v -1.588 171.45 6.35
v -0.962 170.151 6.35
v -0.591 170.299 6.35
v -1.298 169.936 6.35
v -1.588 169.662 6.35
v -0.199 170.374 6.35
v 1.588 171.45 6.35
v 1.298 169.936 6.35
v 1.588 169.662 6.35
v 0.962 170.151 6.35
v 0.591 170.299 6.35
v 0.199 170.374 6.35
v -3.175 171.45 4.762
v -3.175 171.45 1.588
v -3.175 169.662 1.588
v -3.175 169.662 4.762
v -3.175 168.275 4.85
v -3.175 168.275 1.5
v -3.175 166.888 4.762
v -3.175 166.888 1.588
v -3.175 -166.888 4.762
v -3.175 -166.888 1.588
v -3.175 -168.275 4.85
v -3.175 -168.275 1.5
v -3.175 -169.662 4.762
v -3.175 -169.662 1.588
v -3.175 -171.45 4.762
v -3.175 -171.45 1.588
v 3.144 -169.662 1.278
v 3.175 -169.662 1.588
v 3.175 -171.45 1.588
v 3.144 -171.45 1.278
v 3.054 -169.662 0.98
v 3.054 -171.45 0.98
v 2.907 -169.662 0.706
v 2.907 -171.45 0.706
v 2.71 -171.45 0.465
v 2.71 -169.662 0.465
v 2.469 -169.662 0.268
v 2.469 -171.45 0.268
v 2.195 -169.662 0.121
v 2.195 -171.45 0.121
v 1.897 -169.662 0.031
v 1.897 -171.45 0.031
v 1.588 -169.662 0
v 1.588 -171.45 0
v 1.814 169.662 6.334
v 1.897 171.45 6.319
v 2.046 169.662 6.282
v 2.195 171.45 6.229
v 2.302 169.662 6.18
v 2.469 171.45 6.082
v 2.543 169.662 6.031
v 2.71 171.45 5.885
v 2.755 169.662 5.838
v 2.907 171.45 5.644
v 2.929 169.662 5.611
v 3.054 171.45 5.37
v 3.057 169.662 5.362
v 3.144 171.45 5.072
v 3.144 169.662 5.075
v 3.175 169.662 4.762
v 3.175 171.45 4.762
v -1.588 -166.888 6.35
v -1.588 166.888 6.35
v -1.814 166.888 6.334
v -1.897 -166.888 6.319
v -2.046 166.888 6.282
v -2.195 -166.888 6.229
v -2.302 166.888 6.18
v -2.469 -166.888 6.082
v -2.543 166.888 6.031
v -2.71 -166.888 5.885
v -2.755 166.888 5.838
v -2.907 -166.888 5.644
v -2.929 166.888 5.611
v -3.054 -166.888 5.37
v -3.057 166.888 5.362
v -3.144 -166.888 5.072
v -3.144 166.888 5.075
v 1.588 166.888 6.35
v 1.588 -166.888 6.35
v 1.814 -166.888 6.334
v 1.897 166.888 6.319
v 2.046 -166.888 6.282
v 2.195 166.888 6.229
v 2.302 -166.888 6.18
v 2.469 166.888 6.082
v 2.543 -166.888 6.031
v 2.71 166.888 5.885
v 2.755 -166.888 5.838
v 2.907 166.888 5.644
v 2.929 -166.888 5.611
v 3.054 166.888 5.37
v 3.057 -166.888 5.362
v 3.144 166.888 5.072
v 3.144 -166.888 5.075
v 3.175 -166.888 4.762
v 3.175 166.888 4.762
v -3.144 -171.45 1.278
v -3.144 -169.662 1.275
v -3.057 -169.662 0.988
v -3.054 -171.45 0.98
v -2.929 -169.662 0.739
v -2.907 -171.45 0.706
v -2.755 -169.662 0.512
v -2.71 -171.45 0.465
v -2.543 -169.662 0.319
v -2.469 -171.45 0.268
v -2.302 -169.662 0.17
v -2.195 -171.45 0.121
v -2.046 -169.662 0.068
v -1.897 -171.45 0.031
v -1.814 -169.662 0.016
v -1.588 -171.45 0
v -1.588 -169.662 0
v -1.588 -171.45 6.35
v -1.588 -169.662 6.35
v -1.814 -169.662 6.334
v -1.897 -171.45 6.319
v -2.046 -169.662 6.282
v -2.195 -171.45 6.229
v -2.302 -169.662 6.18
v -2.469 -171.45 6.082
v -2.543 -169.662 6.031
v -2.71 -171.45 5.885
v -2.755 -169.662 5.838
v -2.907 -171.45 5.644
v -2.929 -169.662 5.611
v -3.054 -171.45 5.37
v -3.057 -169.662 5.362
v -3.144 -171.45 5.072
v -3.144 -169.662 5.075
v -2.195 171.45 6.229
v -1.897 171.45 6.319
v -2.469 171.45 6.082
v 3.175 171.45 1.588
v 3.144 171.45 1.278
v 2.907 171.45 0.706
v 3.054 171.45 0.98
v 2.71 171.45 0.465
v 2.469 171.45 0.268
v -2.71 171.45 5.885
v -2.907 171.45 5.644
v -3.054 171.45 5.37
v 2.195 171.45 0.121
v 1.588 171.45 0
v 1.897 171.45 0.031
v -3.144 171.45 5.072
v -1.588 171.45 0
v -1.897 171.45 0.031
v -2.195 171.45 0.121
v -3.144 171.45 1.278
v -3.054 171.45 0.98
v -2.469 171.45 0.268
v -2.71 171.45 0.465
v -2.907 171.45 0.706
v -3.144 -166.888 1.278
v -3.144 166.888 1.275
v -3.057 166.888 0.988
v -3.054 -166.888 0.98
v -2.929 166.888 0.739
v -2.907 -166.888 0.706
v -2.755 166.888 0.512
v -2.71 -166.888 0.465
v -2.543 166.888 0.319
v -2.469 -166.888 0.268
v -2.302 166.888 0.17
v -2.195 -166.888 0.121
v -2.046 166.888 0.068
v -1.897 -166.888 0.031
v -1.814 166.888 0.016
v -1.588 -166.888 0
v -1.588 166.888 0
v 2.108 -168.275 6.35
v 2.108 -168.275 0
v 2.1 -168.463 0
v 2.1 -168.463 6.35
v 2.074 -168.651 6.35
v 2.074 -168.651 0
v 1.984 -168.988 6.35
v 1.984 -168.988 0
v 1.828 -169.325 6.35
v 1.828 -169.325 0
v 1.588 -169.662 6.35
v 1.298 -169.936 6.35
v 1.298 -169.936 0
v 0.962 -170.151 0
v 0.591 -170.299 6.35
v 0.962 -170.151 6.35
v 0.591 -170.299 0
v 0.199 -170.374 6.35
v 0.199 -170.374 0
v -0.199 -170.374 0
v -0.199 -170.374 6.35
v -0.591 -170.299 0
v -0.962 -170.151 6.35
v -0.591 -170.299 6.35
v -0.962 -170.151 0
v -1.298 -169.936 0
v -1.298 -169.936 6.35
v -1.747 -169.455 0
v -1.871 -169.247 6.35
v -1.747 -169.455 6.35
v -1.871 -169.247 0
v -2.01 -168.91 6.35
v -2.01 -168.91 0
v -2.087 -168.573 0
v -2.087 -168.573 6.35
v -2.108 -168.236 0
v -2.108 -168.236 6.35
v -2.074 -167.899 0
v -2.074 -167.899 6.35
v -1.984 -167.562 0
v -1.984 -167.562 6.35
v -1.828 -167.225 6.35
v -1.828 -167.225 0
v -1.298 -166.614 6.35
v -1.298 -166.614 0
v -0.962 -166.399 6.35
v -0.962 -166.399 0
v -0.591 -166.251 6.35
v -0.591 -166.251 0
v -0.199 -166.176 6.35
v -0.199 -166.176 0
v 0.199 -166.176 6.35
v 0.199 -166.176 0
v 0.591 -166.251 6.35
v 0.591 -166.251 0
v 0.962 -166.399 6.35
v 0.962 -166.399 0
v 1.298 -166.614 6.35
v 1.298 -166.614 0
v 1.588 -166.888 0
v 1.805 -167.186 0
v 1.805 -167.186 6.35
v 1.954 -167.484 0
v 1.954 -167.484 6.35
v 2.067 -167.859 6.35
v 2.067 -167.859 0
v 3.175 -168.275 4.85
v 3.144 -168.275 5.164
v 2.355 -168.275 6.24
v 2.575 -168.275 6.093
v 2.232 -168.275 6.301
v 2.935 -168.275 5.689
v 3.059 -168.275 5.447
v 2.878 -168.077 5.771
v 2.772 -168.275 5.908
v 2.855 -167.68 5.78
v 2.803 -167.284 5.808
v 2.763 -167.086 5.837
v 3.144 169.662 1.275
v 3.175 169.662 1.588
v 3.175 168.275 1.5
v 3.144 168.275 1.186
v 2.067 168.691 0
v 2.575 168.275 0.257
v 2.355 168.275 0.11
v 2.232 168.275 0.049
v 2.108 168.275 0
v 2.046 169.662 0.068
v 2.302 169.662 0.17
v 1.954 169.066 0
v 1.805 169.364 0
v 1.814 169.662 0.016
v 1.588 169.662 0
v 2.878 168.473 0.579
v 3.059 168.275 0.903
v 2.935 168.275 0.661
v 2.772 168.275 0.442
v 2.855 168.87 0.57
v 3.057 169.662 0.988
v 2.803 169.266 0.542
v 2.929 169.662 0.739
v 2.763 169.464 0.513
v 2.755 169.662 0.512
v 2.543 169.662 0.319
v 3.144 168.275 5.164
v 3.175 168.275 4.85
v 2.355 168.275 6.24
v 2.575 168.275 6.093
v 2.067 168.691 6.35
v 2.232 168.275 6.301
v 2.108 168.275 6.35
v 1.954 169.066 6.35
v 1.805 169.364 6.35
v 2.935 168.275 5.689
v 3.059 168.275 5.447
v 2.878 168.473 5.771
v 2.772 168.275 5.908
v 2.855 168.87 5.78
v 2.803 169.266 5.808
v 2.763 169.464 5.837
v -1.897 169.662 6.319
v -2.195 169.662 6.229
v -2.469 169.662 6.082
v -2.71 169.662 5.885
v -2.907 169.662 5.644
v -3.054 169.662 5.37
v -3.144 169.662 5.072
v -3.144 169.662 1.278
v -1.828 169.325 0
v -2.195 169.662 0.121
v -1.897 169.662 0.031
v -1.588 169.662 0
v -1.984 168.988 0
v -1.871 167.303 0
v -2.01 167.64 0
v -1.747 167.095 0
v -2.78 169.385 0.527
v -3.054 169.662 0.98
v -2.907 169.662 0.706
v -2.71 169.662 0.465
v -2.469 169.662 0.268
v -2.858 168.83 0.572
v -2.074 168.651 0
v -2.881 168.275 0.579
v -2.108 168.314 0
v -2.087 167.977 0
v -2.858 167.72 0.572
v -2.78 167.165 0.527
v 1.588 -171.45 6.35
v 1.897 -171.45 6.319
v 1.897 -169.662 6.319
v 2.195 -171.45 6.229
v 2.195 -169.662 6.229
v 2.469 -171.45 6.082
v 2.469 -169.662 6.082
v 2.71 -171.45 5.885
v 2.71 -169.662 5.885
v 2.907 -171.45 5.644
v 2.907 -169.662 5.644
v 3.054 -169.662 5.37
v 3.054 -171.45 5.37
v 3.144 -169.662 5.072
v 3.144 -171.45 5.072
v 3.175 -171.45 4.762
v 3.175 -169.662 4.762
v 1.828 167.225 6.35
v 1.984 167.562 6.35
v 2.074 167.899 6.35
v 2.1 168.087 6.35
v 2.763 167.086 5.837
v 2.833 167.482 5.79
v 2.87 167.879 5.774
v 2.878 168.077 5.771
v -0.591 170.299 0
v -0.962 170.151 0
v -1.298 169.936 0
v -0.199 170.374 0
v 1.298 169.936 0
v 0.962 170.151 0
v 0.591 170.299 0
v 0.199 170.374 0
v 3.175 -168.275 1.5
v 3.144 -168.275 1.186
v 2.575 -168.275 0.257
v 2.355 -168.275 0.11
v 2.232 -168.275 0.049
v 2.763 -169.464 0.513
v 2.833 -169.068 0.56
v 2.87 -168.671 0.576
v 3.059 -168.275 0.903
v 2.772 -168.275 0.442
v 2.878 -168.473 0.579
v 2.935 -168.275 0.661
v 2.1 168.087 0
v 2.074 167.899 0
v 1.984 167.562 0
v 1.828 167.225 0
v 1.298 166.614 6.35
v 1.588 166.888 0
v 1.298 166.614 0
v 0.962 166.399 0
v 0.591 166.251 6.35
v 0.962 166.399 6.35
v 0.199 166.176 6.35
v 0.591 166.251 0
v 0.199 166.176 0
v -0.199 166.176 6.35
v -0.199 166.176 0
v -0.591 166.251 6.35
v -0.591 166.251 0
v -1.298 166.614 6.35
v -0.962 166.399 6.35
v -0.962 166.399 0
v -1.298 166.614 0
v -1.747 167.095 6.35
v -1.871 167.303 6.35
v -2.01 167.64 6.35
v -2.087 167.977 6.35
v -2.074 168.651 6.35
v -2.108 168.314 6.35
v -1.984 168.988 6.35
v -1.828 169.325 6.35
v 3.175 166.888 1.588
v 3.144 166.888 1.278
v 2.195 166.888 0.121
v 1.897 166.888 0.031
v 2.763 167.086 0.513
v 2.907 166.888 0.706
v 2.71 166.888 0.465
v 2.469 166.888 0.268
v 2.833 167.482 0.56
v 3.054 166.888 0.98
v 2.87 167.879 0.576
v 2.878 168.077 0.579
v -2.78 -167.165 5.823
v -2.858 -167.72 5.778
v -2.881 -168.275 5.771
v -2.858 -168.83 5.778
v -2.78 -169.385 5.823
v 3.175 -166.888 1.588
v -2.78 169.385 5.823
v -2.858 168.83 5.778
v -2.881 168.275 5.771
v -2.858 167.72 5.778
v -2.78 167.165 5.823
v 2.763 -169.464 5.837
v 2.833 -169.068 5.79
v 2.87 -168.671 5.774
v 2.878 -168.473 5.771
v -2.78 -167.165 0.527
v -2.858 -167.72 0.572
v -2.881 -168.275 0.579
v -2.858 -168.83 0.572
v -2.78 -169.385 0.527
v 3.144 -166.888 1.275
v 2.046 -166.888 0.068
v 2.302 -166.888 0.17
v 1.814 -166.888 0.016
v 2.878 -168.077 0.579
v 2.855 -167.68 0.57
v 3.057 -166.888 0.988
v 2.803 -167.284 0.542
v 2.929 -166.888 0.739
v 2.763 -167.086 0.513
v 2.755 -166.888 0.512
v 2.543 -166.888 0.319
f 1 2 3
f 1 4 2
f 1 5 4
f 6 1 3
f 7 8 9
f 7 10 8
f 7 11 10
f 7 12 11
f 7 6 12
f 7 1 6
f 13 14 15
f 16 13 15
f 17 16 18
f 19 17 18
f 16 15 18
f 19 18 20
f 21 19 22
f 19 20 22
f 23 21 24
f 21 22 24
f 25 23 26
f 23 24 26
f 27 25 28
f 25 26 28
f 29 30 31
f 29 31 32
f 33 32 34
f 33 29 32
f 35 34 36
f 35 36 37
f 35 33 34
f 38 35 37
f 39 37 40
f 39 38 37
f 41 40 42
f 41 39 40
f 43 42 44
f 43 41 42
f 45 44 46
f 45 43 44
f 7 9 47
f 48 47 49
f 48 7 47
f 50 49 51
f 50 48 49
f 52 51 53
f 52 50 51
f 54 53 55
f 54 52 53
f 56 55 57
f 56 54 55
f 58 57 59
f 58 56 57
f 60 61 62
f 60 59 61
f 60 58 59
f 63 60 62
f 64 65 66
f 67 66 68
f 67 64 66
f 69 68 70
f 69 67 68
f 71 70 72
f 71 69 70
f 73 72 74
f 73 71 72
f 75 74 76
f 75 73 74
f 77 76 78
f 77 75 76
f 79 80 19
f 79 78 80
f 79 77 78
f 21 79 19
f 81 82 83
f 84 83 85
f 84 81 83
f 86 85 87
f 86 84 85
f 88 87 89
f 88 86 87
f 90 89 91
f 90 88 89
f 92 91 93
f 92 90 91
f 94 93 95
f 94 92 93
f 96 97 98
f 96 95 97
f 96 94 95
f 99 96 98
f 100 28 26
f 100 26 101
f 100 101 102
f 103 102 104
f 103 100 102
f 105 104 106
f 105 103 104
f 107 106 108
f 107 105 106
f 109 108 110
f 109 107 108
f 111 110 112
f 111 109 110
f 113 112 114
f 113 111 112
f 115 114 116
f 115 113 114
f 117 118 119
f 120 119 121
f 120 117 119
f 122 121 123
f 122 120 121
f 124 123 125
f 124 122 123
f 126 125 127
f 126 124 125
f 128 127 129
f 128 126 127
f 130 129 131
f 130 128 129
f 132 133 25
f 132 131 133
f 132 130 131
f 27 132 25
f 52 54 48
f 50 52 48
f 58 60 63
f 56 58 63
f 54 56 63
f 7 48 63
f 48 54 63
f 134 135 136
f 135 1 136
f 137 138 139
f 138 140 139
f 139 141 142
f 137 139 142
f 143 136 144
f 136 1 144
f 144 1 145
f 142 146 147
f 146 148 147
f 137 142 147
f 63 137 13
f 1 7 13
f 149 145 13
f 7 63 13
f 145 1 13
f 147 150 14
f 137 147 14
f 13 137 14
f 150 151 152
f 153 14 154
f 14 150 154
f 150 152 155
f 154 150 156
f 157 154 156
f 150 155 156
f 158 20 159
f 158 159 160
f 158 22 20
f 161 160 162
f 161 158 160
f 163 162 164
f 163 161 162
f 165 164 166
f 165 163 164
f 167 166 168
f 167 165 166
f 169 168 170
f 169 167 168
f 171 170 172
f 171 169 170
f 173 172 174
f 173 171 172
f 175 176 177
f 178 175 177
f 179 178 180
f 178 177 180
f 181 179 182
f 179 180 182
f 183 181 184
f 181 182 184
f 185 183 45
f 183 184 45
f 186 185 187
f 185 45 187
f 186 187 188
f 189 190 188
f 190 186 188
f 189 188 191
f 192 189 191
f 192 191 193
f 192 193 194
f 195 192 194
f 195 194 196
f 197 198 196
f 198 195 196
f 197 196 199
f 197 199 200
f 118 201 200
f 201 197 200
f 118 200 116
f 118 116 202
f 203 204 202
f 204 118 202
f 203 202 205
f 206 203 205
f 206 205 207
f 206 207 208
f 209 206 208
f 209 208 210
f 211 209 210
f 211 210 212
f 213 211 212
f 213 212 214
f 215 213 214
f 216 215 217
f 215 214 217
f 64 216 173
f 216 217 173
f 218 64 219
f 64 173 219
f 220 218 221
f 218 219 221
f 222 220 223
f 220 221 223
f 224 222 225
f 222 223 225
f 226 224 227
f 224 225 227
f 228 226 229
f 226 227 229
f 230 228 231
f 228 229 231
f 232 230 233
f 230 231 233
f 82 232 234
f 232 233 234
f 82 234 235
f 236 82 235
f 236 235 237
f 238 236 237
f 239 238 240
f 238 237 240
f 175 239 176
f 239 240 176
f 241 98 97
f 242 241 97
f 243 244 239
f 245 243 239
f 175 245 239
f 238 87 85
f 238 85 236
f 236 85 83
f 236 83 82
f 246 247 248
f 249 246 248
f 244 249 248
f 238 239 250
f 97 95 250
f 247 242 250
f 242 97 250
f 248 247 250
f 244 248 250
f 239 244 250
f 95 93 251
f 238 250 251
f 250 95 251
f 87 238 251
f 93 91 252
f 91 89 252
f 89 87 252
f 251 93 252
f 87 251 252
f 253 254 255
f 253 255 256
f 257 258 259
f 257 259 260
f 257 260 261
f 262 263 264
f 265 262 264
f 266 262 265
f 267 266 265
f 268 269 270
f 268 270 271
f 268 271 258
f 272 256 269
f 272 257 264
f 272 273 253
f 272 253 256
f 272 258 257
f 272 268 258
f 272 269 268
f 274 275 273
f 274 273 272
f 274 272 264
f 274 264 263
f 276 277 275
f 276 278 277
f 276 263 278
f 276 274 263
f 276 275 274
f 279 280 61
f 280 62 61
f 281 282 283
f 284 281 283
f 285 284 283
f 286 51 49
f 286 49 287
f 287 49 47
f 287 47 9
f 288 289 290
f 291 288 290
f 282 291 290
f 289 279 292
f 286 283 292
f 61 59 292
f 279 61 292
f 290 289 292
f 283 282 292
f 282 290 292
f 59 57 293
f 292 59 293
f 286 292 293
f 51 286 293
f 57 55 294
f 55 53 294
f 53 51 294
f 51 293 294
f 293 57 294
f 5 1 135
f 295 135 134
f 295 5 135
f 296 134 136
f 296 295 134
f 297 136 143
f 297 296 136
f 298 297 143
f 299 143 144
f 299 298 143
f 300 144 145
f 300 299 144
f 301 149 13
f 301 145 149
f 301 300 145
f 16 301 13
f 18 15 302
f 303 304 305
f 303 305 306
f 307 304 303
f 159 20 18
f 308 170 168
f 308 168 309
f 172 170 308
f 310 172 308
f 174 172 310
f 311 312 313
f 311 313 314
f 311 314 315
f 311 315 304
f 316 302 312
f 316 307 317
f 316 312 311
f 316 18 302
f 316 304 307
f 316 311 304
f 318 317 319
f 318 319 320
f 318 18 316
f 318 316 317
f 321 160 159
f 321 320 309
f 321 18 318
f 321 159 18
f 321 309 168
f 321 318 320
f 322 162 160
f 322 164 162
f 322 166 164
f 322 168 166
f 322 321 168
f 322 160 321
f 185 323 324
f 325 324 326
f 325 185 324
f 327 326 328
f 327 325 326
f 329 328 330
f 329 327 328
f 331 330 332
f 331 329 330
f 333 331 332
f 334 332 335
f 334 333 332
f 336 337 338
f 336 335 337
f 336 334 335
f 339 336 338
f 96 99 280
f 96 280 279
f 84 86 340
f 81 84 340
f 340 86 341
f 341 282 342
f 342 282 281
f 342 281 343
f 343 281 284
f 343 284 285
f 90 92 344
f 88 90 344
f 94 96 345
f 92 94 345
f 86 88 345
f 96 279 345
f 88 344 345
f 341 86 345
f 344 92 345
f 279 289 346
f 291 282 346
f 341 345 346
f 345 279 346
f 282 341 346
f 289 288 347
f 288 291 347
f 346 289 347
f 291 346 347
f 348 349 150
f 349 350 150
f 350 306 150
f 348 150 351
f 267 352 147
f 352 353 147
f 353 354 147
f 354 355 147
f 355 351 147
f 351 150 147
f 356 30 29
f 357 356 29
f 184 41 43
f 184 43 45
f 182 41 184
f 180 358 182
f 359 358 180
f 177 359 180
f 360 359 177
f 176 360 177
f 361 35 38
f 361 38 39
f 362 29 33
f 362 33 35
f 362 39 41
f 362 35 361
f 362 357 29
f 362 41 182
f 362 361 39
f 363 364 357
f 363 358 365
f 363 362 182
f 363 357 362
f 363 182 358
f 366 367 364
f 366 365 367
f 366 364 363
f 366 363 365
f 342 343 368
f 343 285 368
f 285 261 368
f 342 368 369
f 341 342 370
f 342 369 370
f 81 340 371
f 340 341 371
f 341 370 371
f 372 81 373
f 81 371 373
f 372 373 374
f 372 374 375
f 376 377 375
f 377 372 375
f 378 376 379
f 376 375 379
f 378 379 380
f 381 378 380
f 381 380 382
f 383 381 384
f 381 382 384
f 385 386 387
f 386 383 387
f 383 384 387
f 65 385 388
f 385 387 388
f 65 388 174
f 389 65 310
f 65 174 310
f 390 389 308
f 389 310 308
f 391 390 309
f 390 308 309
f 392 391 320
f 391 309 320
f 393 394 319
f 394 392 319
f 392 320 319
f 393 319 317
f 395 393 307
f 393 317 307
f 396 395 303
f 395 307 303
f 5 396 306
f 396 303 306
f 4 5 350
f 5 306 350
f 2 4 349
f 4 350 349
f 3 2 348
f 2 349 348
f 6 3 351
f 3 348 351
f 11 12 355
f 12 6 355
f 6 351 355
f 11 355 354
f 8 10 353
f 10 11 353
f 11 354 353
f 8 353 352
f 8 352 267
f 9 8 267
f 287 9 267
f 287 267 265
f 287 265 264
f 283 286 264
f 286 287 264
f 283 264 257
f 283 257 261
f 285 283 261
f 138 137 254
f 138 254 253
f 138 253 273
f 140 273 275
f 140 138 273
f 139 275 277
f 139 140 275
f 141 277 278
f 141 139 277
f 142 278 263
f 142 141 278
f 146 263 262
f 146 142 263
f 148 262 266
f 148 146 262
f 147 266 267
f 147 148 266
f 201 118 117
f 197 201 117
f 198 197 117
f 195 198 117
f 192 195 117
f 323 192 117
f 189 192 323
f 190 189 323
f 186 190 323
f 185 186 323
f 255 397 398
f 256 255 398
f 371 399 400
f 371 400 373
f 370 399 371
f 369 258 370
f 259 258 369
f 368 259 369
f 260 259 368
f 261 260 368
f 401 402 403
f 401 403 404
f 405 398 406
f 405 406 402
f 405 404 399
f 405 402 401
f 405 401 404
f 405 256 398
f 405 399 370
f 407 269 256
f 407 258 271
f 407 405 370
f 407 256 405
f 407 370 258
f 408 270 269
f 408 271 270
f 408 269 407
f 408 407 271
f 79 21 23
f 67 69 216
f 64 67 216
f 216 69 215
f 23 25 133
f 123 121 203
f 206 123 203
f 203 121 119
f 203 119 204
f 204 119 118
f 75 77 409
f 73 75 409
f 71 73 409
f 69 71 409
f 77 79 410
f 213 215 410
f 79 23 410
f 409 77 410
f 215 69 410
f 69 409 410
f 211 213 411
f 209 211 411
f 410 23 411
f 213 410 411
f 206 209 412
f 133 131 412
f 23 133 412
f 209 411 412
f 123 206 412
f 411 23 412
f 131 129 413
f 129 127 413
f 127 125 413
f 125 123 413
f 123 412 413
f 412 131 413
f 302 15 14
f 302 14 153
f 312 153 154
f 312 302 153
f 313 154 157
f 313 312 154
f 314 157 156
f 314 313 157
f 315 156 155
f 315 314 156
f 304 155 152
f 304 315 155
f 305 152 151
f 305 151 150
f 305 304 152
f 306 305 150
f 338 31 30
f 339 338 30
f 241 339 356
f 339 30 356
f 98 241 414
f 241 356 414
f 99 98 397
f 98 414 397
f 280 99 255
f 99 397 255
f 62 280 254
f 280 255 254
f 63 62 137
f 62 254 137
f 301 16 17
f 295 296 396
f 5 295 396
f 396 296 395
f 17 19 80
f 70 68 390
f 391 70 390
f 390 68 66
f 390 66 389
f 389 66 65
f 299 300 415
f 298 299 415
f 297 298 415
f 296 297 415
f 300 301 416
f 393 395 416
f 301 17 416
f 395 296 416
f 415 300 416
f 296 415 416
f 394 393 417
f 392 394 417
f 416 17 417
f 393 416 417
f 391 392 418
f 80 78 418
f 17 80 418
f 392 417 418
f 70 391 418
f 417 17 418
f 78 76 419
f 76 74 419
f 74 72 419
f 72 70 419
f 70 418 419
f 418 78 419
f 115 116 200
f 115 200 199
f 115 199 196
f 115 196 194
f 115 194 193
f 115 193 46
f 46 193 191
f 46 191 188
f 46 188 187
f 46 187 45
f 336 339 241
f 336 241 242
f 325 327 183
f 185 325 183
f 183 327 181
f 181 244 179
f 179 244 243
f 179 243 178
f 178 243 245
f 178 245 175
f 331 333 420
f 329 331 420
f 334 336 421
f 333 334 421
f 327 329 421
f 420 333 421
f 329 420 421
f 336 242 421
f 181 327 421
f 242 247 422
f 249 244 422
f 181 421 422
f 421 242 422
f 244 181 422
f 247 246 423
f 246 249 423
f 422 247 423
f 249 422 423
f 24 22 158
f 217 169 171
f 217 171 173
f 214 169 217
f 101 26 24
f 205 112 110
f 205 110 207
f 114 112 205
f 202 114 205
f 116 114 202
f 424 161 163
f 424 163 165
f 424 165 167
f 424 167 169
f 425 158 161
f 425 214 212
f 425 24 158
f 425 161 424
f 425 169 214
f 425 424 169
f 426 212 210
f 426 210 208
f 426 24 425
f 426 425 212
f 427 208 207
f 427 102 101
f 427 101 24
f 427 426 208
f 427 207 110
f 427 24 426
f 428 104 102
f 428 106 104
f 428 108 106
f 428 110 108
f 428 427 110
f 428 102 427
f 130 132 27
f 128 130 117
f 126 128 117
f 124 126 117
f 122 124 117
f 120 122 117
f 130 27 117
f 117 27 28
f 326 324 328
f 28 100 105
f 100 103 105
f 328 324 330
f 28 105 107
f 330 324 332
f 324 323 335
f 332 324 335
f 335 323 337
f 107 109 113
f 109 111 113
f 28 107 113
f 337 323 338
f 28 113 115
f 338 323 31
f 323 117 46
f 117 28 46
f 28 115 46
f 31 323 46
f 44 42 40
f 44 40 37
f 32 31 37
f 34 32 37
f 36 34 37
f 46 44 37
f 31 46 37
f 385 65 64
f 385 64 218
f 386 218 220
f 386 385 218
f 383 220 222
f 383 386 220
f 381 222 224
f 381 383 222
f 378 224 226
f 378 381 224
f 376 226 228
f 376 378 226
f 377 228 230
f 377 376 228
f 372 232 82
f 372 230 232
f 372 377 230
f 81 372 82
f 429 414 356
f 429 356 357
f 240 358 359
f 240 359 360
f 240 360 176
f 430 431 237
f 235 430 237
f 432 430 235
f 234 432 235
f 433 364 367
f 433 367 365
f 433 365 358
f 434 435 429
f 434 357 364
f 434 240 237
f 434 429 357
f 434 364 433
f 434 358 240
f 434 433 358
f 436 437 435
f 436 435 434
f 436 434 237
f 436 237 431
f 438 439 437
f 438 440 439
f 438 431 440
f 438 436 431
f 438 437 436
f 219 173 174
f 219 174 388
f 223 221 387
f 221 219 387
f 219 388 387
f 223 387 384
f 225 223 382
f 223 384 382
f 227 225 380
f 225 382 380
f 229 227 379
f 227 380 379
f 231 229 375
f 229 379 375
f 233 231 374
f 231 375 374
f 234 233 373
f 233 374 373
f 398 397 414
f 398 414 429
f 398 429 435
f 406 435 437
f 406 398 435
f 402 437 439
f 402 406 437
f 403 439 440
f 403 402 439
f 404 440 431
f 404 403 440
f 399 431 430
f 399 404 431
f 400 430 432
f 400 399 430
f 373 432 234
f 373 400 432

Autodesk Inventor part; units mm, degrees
ref_plane "YZ Plane" through (0, 0, 0) normal (1, 0, 0) x (0, 1, 0)
ref_plane "XZ Plane" through (0, 0, 0) normal (0, 1, 0) x (-1, 0, 0)
ref_plane "XY Plane" through (0, 0, 0) normal (0, 0, 1) x (1, 0, 0)
sketch "Sketch1" plane through (0, 0, 0) normal (0, 0, 1) x (1, 0, 0)
  line L0 (3.175, 171.45) -> (-3.175, 171.45)
  line L1 (-3.175, 171.45) -> (-3.175, -171.45)
  line L2 (-3.175, -171.45) -> (3.175, -171.45)
  line L3 (3.175, -171.45) -> (3.175, 171.45)
  line L4 (3.175, 171.45) -> (-3.175, -171.45) construction
  line L5 (-3.175, 171.45) -> (3.175, -171.45) construction
  circle A0 centre (0, -168.275) radius 2.1082
  circle A1 centre (0, 168.275) radius 2.1082
  point P0 (0, 0)
  dimension "d0" = 6.35
  dimension "d1" = 342.9
  dimension "d2" = 4.2164
  dimension "d3" = 3.175
  dimension "d4" = 4.2164
  dimension "d5" = 3.175
extrude "Extrusion1" add sketch "Sketch1" along normal blind 6.35
fillet "Fillet1" radius 1.5875 4 edges at (3.175, 0, 0) (3.175, 0, 6.35) (-3.175, 0, 0) (-3.175, 0, 6.35)
properties part number "Blocker B" material "Stainless Steel"
